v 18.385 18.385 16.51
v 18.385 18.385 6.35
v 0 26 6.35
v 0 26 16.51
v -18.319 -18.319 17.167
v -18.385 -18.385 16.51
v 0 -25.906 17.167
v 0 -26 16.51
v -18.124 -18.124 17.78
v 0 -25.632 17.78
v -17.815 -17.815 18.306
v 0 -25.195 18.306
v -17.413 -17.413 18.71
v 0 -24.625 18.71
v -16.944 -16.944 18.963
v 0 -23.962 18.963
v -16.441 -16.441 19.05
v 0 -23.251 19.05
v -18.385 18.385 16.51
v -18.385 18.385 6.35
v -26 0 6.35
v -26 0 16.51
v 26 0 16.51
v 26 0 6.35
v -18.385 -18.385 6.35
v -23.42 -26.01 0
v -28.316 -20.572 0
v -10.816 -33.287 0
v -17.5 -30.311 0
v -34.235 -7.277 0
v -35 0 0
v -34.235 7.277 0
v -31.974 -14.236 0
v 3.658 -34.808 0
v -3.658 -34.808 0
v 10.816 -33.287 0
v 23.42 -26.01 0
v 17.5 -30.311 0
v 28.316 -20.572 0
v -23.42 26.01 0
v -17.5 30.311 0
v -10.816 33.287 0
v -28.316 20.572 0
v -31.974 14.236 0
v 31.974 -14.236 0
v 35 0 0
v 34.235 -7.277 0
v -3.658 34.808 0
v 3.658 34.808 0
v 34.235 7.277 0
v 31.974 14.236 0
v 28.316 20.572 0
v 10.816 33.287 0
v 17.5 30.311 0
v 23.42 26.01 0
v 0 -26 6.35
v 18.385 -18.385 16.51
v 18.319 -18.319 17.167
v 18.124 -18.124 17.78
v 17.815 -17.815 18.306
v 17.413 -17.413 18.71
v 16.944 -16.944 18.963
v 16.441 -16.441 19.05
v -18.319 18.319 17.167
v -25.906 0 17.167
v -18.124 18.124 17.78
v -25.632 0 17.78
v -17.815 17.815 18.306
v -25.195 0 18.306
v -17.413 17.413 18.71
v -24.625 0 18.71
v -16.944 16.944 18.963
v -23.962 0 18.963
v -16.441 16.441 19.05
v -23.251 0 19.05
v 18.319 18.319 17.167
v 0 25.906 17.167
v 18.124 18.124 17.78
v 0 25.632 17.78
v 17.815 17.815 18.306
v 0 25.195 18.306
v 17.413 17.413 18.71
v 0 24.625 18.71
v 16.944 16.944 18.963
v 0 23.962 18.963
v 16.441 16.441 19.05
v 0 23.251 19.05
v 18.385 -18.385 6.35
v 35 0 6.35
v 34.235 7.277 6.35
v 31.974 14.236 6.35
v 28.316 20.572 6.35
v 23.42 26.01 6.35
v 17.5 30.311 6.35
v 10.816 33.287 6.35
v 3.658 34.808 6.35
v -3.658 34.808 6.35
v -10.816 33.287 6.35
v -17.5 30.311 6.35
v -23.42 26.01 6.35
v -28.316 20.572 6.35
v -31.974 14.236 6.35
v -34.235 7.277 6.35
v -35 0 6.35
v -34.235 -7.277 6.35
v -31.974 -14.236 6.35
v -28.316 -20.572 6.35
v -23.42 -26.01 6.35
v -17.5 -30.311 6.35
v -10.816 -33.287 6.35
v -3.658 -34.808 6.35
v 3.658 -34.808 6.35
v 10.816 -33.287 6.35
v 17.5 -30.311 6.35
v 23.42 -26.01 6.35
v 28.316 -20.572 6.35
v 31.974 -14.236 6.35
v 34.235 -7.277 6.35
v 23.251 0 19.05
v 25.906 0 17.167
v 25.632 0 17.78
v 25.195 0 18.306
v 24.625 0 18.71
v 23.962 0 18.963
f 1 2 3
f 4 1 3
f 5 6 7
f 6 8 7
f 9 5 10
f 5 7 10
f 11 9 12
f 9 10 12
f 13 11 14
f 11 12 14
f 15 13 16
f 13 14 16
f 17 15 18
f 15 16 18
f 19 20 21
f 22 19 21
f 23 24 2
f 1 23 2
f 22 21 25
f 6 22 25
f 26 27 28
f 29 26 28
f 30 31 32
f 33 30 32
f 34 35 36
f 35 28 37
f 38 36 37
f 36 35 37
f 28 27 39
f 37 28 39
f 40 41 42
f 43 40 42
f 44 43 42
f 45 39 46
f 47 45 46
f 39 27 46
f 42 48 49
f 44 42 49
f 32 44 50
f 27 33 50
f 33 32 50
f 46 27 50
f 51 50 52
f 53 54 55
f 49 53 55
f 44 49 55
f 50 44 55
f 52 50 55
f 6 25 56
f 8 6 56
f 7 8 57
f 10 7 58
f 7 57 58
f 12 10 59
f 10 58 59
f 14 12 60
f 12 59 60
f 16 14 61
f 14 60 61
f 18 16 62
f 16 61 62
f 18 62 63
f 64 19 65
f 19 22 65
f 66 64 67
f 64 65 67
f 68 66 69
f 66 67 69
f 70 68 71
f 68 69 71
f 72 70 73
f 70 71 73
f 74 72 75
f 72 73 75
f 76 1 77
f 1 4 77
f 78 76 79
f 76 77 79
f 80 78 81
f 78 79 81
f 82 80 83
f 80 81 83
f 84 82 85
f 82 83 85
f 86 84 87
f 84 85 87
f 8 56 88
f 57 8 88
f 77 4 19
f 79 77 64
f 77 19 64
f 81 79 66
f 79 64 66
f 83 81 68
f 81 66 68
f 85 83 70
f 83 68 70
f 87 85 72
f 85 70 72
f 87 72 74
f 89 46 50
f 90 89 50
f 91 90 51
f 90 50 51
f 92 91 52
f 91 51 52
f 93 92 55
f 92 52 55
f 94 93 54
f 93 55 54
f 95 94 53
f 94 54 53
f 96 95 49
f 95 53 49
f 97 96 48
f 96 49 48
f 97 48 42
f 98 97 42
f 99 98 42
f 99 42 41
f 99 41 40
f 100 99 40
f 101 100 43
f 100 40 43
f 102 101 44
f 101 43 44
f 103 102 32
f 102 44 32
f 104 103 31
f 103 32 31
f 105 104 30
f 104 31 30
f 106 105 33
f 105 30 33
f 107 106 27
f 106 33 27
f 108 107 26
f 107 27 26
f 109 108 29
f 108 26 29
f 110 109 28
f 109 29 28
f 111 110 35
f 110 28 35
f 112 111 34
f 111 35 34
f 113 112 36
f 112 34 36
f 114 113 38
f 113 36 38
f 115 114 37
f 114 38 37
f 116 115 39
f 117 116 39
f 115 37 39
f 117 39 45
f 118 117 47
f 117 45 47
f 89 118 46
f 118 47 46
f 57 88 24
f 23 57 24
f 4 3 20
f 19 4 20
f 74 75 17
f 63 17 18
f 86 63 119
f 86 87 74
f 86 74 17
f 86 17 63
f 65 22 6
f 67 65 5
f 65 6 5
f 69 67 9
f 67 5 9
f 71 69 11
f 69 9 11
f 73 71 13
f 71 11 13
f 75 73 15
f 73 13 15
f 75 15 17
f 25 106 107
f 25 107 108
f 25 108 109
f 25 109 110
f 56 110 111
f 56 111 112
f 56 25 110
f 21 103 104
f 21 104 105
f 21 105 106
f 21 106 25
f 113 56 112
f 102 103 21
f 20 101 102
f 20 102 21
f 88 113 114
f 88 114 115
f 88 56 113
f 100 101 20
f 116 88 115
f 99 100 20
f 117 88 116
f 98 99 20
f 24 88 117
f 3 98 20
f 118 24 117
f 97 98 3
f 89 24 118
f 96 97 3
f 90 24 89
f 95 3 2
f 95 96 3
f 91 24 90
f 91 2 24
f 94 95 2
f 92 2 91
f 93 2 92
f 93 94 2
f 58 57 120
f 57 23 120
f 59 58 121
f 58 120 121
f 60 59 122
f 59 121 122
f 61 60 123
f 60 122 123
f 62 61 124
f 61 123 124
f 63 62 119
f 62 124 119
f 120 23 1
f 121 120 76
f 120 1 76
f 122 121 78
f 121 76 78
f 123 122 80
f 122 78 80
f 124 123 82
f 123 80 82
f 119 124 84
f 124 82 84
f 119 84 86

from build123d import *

# Parameters (mm, degrees)
F0_R     = 35
F1_DEPTH = 6.35
F3_DEPTH = 12.7
F4_R     = 2.54


with BuildPart() as f1:
    # F0 (on Top) → F1 (new body)
    with BuildSketch(Plane.XY):
        Circle(F0_R)
    extrude(amount=F1_DEPTH)

    # F2 (on face) → F3 (join)
    with BuildSketch(Plane.XY.offset(6.35)):
        Polygon((18.384776, -18.384776), (26, 0), (18.384776, 18.384776), (0, 26), (-18.384776, 18.384776), (-26, 0), (-18.384776, -18.384776), (0, -26), align=None)
    extrude(amount=F3_DEPTH)

    # F4
    f4_edges = [f1.edges().sort_by_distance(p)[0] for p in [
        (22.192388, -9.192388, 19.05),
        (22.192388, 9.192388, 19.05),
        (9.192388, 22.192388, 19.05),
        (-9.192388, 22.192388, 19.05),
        (9.192388, -22.192388, 19.05),
        (-9.192388, -22.192388, 19.05),
        (-22.192388, -9.192388, 19.05),
        (-22.192388, 9.192388, 19.05),
    ]]
    fillet(f4_edges, radius=F4_R)


solid = f1.part
